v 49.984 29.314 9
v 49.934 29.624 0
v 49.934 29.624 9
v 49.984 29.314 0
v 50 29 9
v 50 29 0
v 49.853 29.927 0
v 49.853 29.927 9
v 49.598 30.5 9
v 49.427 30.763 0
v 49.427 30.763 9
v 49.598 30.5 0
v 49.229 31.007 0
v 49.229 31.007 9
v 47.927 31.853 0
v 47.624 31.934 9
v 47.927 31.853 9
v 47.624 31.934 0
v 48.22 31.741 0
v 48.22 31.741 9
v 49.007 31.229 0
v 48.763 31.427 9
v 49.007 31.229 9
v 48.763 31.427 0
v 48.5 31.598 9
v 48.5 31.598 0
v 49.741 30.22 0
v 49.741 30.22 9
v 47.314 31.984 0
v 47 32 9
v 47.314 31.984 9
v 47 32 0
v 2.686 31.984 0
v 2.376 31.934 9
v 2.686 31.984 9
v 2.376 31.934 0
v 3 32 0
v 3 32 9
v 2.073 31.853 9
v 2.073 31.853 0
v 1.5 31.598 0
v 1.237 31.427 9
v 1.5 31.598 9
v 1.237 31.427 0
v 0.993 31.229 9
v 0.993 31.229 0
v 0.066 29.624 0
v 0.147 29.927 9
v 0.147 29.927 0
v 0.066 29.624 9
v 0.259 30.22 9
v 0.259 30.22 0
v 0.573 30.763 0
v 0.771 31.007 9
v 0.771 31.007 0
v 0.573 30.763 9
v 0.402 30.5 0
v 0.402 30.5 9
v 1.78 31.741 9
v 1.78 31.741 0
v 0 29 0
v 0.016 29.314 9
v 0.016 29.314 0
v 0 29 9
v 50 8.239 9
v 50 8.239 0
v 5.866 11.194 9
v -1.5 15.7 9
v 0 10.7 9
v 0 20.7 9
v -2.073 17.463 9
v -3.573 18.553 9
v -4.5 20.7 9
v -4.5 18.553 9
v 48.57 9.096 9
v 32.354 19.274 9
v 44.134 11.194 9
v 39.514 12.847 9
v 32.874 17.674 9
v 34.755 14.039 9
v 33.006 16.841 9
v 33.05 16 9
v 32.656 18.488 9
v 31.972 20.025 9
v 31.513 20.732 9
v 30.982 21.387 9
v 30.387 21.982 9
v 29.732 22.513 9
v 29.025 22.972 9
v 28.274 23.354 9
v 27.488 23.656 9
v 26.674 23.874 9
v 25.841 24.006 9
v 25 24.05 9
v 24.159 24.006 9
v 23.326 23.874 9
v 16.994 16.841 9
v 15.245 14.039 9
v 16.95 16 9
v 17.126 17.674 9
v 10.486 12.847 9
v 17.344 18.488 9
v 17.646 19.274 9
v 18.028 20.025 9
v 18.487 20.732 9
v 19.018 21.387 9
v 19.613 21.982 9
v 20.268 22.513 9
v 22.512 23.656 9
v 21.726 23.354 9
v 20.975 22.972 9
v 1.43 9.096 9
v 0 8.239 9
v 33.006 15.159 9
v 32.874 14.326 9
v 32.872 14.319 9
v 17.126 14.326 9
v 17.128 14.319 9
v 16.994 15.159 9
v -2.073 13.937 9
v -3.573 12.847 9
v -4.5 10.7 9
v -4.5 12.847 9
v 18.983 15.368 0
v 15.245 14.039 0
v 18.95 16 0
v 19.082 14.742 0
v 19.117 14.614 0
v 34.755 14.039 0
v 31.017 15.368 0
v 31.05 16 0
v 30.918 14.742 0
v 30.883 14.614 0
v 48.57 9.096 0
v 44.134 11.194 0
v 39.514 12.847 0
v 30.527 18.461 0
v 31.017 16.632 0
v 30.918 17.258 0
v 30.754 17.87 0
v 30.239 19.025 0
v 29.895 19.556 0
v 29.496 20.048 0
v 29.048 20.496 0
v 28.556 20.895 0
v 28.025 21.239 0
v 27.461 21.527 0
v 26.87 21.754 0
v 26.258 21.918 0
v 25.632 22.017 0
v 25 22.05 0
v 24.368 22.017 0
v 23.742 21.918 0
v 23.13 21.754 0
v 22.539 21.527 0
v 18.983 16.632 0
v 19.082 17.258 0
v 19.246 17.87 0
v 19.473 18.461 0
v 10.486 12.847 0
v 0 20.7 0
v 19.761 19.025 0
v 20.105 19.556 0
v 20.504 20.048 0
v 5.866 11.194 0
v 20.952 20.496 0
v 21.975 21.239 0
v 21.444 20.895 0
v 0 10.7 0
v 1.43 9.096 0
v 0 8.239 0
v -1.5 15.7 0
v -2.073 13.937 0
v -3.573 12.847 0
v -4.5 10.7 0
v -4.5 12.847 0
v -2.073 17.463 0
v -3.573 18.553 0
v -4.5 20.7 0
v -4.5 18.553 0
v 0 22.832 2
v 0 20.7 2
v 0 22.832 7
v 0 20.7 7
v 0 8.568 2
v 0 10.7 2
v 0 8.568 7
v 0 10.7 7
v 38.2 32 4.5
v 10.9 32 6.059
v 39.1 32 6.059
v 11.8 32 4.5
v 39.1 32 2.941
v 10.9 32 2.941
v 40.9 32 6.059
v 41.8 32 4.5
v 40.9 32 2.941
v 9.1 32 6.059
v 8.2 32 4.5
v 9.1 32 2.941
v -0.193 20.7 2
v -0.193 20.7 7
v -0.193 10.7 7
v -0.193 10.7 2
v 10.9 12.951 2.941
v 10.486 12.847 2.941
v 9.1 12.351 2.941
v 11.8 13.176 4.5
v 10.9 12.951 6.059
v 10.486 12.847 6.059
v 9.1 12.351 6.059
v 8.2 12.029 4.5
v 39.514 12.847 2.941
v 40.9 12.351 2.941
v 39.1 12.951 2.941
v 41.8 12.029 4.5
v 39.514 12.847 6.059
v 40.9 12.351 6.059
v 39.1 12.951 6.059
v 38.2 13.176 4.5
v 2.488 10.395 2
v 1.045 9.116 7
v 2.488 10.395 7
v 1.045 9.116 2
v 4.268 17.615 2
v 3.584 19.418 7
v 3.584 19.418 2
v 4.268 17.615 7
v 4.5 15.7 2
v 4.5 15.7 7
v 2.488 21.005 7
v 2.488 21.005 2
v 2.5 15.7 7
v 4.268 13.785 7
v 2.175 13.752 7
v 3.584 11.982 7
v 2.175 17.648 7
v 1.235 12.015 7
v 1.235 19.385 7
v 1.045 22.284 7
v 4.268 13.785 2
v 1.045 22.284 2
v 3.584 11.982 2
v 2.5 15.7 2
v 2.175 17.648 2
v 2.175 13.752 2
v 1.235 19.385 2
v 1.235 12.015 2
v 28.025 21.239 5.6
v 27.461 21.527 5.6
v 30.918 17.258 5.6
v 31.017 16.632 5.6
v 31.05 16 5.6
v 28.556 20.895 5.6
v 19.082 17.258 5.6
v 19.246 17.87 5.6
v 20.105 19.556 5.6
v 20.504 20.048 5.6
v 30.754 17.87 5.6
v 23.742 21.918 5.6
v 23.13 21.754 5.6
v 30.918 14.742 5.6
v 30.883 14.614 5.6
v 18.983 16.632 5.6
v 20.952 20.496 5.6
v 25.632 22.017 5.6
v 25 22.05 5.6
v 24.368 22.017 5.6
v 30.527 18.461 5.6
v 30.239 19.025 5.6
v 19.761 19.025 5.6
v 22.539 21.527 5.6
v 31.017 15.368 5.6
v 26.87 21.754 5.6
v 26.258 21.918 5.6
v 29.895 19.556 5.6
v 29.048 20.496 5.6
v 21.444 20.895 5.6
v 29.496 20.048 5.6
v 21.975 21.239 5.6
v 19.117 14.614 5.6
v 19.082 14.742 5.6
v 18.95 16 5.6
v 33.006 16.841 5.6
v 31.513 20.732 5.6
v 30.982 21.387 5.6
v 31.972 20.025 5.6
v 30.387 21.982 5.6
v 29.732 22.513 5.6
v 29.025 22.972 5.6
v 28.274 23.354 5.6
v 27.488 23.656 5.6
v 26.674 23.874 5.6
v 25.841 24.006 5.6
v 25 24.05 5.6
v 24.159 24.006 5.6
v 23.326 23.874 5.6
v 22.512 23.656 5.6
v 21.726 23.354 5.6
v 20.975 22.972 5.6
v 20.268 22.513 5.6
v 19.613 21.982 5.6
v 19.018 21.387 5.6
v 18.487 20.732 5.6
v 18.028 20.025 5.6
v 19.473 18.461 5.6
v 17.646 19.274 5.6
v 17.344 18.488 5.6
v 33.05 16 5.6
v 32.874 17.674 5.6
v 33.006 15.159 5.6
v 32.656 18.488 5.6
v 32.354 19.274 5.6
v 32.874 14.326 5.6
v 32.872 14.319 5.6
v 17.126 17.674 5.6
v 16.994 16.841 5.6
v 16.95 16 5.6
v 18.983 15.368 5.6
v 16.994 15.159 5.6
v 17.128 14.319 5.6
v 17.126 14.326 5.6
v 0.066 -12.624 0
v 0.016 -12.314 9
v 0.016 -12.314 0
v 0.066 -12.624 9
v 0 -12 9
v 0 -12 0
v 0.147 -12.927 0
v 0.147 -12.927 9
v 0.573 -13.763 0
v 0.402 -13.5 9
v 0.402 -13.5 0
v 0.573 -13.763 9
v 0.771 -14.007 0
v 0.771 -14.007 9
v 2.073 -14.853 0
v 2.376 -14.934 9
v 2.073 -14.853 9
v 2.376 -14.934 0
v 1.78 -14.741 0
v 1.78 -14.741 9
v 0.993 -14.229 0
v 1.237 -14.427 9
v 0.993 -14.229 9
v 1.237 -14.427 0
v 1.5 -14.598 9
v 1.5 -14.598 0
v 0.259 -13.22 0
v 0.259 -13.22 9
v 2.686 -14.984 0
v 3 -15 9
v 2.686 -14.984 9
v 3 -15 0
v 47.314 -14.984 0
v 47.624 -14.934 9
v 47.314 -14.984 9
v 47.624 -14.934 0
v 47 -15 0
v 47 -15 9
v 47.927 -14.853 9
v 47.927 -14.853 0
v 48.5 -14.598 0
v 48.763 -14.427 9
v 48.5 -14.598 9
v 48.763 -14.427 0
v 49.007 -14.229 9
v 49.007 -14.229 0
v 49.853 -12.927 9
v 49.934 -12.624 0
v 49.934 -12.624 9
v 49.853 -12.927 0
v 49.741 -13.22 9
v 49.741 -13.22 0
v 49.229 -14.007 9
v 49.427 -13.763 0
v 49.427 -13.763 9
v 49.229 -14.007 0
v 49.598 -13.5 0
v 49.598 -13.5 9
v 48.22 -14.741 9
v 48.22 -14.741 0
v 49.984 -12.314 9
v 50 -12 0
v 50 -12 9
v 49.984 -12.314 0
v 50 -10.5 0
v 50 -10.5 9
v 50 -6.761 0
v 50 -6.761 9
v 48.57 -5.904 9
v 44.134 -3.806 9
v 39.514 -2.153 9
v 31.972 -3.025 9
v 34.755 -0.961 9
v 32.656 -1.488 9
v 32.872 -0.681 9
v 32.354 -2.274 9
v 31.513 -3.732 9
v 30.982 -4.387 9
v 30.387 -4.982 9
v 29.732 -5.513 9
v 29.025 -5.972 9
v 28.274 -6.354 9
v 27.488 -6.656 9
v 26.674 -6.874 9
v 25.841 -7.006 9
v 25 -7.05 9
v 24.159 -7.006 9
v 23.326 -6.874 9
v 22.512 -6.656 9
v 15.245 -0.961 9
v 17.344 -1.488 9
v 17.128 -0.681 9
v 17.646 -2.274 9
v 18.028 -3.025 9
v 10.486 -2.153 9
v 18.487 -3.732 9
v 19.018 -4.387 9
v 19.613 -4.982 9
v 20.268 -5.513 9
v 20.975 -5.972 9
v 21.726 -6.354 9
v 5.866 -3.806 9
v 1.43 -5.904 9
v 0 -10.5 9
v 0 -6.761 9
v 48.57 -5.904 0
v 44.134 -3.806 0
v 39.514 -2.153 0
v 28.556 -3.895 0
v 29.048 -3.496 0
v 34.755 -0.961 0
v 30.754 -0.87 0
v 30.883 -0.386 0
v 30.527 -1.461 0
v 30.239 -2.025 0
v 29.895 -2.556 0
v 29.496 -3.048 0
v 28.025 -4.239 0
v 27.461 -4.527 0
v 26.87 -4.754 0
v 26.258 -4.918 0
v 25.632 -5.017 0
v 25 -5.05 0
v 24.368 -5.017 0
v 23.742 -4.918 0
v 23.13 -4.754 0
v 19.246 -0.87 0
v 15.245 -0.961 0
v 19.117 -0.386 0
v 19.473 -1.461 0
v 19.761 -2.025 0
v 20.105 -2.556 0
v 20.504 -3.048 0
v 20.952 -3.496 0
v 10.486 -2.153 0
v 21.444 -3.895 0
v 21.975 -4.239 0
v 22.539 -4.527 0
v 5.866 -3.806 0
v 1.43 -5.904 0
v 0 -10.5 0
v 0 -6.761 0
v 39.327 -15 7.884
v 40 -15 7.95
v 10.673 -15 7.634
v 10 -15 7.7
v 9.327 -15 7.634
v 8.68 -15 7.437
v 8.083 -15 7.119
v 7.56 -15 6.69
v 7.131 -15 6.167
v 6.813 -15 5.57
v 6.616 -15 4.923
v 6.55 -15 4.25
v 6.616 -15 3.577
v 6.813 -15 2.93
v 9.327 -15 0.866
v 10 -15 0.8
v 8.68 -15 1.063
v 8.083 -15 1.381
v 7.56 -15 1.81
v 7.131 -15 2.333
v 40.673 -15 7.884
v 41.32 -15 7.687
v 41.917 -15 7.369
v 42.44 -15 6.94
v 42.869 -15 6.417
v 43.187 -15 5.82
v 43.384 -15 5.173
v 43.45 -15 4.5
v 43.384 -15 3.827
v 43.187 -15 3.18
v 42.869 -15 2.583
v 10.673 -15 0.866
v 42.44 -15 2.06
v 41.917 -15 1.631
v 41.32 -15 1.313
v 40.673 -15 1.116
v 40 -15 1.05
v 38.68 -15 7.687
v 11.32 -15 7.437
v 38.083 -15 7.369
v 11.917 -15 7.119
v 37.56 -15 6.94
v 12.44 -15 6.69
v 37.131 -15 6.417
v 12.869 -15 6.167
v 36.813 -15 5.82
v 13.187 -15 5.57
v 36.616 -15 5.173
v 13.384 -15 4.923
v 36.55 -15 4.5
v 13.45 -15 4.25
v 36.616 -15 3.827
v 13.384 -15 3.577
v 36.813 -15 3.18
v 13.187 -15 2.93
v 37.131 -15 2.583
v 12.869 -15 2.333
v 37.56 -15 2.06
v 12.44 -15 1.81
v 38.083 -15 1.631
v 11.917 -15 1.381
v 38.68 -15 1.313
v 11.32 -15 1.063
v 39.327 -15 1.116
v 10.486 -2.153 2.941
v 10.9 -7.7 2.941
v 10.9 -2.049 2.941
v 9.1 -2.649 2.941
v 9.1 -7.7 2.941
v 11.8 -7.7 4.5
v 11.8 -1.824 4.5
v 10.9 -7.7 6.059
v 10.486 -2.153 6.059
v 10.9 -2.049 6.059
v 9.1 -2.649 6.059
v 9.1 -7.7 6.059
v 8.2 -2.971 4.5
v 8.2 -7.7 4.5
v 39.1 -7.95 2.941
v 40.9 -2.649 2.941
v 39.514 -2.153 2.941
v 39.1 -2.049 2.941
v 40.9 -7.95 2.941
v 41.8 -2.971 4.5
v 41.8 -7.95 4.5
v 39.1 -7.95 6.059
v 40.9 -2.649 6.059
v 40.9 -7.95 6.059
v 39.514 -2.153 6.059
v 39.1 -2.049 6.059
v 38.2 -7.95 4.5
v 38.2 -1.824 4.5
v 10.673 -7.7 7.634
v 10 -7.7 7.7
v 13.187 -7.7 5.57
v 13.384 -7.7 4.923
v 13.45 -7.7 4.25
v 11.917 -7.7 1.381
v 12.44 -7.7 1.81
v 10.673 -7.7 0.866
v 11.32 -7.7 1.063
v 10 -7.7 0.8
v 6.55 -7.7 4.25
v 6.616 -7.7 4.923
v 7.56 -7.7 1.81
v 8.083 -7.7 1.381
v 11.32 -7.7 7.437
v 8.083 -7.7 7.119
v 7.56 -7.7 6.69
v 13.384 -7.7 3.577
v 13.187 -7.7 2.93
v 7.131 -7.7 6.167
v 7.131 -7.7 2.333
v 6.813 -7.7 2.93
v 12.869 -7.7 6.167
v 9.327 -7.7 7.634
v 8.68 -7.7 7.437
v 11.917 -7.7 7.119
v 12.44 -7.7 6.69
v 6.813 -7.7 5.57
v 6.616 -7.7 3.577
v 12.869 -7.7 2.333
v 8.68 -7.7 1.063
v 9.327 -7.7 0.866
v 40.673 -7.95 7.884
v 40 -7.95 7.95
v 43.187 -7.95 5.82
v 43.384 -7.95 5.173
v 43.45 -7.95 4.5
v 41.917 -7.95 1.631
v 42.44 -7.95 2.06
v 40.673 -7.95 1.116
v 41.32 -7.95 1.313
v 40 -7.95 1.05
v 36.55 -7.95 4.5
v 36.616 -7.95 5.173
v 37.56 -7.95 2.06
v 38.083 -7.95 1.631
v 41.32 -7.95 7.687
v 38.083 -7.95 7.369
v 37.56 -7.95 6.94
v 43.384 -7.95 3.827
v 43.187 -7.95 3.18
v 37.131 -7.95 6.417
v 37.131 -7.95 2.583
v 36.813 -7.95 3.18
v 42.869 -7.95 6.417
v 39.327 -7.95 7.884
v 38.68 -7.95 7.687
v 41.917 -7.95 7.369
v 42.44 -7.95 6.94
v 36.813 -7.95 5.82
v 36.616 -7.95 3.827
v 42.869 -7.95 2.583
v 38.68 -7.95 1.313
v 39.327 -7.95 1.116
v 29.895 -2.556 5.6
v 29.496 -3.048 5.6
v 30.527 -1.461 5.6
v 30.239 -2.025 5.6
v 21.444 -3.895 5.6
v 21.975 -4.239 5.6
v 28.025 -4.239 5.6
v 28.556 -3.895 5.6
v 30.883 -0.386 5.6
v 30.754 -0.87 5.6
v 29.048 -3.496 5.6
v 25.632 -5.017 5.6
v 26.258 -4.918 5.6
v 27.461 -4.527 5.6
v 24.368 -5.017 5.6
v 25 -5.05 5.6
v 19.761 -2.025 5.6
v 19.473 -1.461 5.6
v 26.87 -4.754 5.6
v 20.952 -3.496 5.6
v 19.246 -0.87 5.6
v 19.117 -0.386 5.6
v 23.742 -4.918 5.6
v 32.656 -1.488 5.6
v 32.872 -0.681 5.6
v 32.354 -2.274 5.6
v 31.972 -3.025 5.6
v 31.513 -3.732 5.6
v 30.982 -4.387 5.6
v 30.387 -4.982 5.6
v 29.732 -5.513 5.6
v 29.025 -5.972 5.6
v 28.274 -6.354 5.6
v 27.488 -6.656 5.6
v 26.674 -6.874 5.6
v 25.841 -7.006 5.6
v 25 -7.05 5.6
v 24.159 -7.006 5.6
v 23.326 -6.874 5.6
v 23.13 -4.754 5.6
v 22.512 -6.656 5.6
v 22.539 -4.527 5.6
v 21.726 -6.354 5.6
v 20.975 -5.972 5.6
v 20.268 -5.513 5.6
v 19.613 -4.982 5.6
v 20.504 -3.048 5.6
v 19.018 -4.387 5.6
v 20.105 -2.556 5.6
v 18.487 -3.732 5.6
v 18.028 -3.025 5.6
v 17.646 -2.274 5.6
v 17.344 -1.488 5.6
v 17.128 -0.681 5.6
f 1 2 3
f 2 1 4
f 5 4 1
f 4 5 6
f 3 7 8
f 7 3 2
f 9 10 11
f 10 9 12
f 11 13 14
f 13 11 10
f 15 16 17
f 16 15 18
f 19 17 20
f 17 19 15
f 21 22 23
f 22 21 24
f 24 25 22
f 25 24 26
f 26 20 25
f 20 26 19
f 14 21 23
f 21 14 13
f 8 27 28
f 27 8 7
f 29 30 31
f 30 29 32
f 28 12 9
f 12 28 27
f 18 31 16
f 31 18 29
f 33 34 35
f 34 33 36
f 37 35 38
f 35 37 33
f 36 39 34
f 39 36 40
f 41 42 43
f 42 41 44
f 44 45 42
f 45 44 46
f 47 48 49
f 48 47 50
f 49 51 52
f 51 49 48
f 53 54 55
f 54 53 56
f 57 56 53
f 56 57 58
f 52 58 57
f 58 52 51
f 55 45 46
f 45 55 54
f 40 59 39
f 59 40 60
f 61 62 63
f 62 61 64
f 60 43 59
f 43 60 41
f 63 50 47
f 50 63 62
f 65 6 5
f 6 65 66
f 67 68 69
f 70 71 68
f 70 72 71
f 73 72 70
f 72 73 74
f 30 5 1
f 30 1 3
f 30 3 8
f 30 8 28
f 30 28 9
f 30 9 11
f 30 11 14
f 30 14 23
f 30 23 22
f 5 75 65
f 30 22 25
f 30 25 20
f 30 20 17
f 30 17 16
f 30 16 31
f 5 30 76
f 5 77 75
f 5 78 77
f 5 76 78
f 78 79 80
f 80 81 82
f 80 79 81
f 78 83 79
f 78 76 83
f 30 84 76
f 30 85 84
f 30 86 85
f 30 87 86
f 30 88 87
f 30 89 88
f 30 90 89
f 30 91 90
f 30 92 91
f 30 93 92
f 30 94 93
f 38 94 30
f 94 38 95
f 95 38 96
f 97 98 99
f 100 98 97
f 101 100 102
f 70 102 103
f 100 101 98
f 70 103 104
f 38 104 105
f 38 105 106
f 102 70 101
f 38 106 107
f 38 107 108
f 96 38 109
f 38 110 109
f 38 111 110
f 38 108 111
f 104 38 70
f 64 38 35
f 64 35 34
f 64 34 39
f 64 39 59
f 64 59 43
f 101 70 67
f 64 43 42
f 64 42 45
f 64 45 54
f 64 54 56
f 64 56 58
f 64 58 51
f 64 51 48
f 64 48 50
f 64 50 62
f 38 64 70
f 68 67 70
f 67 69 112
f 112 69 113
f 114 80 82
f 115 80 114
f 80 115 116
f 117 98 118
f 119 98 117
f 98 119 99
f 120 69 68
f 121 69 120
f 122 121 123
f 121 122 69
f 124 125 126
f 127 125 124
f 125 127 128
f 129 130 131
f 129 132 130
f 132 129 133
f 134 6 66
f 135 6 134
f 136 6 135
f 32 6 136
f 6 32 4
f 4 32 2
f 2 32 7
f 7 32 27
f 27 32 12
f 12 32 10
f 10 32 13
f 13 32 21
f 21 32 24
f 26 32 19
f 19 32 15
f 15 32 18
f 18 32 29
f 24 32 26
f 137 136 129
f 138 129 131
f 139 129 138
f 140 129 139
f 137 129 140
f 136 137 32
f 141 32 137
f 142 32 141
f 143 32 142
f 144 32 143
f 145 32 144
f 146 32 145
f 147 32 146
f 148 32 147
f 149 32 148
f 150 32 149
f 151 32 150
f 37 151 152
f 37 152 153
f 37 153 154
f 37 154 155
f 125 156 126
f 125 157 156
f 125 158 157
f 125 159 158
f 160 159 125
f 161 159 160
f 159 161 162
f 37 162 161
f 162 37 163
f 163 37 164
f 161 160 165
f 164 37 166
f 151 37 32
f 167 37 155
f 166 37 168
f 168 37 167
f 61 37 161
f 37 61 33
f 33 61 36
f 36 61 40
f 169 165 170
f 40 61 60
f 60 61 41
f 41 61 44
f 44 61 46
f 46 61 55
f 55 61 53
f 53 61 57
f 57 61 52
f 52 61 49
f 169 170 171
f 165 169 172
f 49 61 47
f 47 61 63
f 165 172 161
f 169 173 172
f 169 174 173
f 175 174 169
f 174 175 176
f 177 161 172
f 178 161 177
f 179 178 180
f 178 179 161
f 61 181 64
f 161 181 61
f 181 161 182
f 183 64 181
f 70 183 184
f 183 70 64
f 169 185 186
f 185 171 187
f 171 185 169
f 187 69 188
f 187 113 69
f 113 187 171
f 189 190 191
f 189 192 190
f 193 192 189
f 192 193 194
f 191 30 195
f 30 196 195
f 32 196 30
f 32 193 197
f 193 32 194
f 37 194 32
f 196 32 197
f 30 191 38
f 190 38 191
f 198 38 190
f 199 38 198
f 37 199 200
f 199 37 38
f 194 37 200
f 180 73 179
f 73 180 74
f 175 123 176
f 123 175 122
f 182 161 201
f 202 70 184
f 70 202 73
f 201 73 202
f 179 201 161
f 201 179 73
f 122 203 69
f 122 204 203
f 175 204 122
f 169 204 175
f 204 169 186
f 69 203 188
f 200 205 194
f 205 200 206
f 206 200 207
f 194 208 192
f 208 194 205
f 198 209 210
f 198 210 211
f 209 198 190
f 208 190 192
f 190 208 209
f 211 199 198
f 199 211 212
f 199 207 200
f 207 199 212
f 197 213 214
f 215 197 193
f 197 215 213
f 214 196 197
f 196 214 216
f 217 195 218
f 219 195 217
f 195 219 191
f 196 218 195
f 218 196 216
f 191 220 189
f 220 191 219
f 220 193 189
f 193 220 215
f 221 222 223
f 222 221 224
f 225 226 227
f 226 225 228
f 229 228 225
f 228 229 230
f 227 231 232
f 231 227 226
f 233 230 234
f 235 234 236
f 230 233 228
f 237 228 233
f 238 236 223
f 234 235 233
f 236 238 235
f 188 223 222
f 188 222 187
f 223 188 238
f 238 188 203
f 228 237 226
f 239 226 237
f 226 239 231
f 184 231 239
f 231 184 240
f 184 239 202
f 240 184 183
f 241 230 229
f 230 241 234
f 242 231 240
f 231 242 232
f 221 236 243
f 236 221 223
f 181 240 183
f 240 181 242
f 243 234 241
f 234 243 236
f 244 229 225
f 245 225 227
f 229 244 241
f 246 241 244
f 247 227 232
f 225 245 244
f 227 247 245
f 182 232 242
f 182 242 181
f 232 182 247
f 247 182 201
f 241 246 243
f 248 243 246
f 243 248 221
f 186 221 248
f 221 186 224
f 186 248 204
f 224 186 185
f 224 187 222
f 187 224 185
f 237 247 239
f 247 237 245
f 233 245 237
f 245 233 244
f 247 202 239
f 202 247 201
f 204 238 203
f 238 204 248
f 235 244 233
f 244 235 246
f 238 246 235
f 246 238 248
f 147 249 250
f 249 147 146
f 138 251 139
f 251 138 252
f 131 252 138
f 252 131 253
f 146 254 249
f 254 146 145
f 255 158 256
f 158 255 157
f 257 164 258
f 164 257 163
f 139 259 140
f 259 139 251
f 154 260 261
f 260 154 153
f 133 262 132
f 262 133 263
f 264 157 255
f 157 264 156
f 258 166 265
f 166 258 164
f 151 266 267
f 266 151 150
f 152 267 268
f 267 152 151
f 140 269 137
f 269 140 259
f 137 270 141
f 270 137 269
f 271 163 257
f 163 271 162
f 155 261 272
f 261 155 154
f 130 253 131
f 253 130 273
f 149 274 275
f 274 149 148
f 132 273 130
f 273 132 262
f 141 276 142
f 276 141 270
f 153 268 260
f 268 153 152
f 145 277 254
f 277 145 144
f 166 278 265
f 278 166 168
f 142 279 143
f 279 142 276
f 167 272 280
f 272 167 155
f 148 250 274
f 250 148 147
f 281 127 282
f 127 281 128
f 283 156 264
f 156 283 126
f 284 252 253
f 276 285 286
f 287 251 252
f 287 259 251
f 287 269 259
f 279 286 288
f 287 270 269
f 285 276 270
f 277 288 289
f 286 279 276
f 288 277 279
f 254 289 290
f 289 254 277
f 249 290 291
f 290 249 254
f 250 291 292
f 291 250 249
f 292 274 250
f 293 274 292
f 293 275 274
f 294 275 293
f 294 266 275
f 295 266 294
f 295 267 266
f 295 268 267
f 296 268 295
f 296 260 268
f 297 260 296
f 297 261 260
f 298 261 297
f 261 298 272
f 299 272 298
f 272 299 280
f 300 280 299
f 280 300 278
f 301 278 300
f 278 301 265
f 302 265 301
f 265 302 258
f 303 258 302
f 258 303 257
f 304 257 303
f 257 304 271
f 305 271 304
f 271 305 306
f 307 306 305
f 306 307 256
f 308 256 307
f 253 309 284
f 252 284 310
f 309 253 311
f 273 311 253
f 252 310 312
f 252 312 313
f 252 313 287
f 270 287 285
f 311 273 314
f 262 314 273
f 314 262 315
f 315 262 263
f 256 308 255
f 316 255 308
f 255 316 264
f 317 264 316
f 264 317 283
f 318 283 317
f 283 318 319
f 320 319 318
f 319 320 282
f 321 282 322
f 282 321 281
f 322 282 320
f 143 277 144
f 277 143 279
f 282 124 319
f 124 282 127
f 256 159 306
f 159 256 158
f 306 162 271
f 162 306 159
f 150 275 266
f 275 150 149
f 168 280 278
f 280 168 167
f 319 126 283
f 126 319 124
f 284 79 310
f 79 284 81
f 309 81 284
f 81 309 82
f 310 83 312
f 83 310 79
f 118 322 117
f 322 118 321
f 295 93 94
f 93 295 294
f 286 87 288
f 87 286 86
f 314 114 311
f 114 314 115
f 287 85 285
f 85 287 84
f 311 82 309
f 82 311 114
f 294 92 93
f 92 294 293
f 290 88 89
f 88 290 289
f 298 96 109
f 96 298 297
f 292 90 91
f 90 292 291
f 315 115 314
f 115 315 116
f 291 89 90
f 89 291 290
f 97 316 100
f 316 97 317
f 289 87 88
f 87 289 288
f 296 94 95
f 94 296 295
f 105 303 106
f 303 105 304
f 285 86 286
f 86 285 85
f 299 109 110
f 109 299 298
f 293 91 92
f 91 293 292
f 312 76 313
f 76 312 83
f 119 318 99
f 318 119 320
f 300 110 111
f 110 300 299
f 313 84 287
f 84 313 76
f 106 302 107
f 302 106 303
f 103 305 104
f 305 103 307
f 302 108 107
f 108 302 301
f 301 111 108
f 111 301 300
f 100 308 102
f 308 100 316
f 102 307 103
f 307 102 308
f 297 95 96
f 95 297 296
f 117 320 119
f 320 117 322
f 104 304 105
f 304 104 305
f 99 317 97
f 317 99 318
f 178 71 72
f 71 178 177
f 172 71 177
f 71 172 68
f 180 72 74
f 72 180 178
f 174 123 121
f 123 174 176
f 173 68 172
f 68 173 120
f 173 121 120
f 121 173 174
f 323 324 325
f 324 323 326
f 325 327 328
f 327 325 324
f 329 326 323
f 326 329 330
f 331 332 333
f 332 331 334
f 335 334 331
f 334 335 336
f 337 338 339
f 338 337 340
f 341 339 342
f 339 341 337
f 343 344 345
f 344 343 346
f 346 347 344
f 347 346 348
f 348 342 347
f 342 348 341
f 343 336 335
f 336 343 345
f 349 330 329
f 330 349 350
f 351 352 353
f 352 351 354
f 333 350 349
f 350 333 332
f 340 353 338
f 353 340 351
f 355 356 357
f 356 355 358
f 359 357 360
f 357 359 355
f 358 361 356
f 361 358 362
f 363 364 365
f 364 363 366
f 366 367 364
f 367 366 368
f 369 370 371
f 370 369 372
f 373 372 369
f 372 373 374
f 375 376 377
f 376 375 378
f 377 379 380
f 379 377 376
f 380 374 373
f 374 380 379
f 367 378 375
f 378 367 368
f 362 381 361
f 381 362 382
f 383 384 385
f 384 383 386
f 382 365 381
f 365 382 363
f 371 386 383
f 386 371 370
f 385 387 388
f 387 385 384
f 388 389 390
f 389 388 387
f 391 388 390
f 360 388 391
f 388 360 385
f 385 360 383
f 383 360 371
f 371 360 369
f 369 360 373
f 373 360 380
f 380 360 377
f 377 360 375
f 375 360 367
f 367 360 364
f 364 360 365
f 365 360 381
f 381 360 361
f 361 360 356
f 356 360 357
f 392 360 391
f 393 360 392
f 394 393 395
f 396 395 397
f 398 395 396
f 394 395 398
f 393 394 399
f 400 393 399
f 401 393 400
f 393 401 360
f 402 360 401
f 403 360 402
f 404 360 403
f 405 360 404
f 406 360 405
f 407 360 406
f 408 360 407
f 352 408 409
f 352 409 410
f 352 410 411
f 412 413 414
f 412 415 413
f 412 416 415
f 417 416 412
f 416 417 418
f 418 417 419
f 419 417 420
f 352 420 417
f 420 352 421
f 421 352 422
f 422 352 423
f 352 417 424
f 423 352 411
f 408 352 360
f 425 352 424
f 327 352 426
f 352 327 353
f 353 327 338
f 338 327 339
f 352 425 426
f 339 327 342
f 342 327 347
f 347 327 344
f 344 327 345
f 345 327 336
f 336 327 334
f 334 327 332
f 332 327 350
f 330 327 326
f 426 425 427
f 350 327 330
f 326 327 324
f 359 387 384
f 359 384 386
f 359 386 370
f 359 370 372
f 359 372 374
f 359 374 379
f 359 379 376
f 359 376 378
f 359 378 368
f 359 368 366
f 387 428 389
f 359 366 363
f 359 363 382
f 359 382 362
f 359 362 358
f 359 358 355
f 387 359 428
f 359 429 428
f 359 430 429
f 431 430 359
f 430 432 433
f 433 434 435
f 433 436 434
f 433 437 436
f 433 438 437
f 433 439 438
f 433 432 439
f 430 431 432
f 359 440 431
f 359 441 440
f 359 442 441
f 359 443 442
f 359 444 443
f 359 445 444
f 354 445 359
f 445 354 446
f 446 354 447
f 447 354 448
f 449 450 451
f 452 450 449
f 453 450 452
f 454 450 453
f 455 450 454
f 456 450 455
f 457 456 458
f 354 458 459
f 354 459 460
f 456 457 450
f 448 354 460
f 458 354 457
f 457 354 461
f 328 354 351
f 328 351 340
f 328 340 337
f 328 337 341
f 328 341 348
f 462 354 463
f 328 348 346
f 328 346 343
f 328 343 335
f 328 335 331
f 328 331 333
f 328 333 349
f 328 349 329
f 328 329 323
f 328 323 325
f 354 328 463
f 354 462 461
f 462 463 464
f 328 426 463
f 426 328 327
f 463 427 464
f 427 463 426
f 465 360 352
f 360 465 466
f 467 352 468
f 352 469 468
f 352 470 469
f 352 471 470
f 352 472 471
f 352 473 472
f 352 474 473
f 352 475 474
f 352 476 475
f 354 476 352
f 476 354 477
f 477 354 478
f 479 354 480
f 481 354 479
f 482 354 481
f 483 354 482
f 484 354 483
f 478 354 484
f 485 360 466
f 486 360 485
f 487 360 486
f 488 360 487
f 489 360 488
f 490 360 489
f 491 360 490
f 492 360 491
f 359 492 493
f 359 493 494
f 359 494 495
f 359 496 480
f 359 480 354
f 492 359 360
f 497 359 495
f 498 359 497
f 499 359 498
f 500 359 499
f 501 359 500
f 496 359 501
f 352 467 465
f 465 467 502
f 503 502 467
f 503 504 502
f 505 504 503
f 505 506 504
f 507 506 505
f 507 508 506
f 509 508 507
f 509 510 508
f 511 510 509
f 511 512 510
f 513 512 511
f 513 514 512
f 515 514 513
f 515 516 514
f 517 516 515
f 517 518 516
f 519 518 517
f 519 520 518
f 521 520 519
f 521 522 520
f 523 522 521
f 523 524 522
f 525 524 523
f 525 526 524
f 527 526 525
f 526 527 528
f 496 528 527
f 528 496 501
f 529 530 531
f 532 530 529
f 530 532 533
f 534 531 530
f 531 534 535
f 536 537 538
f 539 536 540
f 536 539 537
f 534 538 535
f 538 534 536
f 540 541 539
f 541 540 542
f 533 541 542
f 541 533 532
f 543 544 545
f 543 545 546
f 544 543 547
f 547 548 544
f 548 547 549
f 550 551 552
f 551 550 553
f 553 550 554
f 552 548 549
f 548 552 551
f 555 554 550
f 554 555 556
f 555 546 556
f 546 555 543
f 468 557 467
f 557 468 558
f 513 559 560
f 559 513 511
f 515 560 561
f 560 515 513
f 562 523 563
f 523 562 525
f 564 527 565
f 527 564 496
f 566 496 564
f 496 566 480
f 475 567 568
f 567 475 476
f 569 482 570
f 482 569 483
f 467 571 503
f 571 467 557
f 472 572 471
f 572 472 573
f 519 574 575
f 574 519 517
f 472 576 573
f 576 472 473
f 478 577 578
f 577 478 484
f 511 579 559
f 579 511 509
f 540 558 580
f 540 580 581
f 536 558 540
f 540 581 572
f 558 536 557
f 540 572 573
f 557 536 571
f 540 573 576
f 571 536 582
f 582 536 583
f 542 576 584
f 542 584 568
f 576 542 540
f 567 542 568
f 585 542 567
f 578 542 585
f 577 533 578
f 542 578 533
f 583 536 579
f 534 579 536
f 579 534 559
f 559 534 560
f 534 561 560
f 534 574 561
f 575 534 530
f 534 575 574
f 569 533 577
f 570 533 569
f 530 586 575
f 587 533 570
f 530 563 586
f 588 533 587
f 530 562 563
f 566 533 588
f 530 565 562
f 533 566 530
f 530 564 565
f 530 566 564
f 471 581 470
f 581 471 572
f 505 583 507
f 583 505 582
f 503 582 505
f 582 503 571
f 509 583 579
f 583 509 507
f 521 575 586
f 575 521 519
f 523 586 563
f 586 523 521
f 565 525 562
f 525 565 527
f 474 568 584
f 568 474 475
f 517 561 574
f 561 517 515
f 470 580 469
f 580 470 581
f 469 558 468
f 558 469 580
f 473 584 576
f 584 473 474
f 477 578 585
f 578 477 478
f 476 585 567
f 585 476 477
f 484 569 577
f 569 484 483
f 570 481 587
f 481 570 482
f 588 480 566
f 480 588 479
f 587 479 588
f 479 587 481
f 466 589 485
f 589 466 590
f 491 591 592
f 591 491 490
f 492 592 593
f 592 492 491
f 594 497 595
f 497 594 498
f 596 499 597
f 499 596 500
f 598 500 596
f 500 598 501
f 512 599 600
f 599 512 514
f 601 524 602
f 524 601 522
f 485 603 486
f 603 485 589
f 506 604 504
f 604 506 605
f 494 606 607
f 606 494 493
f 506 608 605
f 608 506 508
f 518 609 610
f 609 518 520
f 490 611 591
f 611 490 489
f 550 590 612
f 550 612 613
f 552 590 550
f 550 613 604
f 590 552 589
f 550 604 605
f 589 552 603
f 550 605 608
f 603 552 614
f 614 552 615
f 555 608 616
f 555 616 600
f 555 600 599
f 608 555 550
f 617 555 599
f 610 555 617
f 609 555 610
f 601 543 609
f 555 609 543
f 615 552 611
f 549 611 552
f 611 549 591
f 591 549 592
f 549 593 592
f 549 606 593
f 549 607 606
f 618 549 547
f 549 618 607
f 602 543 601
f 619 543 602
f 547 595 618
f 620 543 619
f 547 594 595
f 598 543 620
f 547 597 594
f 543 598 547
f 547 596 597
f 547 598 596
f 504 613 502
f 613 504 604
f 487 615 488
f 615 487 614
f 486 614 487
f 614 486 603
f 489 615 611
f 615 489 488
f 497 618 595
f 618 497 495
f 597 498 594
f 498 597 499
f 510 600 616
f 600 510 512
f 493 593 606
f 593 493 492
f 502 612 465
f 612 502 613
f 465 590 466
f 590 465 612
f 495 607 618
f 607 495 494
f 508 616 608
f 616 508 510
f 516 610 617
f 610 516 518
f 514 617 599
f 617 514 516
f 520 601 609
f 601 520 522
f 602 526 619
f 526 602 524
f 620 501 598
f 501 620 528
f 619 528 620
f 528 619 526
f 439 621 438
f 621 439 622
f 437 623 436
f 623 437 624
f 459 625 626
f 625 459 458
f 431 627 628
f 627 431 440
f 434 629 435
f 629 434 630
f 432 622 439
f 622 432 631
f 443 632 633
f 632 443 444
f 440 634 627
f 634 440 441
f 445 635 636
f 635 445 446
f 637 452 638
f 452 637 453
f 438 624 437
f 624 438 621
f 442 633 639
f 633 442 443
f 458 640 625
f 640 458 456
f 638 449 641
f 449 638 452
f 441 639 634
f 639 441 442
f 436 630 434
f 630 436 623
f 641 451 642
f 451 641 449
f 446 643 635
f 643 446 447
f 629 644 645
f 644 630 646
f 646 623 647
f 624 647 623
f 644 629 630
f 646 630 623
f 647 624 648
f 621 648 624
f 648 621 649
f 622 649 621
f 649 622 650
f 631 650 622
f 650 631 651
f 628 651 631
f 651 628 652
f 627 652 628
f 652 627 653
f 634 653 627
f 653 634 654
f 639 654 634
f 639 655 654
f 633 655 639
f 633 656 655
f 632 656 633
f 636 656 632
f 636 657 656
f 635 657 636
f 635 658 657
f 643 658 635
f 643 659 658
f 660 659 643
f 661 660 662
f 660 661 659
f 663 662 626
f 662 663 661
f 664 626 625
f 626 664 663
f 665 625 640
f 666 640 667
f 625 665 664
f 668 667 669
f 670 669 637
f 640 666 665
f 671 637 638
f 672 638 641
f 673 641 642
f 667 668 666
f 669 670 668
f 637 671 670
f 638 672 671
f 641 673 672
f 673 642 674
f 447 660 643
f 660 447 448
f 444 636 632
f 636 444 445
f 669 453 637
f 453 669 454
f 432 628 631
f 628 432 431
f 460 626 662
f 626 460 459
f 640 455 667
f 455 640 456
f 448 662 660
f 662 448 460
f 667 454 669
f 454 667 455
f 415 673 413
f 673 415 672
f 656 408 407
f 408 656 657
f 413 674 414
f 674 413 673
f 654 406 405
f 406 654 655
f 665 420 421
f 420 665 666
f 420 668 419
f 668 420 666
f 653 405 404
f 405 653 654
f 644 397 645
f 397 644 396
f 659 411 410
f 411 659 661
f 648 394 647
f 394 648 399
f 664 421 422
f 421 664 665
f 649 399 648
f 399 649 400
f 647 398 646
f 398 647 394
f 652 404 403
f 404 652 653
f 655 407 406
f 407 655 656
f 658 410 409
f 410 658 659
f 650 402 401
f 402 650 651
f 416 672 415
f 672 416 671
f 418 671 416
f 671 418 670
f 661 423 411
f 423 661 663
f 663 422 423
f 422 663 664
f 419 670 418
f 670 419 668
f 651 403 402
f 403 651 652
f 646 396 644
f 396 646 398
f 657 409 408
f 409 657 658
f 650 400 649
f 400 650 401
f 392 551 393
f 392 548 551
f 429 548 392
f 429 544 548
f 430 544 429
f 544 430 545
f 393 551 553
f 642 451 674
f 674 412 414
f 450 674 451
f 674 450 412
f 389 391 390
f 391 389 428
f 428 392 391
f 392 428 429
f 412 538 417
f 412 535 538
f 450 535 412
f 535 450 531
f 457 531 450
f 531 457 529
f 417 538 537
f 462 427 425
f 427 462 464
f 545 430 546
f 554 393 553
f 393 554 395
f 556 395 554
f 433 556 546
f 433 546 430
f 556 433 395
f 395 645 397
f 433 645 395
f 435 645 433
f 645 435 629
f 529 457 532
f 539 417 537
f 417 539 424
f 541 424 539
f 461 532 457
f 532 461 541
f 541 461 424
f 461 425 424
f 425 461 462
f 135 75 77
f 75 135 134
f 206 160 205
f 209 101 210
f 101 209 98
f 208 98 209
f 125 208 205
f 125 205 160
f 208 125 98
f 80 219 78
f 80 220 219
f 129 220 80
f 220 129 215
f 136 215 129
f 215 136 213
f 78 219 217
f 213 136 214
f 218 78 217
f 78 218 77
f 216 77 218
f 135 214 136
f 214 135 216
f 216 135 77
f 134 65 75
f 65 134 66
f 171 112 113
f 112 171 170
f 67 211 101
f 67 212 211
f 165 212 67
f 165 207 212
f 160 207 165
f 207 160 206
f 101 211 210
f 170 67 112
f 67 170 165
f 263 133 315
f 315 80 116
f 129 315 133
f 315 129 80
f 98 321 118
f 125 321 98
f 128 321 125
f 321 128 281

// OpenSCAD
// file: ../library.scad
//rounded cube Functions from: http://www.thingiverse.com/thing:38069


module cube_fillet(size,radius=-1,vertical,top,bottom,center=false,$fn=0){
    if (center) {
        cube_fillet_inside(size, radius, vertical, top, bottom, $fn=$fn);
    } else {
        translate([size[0]/2, size[1]/2, size[2]/2])
            cube_fillet_inside(size, radius, vertical, top, bottom, $fn=$fn);
    }
}
module fillet(radius, height=100, $fn=60) {  
    //this creates negative of fillet,
    //i.e. thing to be substracted from object
    translate([-radius, -radius, -height/2-0.01])
        difference() {
            cube([radius*2, radius*2, height+0.02]);
            cylinder(r=radius, h=height+0.02, $fn=$fn);
        }
}

module cube_negative_fillet(size,radius=-1,vertical, top,bottom,$fn=0){
    j=[1,0,1,0];

    for (i=[0:3]) {
        if (radius > -1) {
            rotate([0, 0, 90*i])
                translate([size[1-j[i]]/2, size[j[i]]/2, 0])
                    fillet(radius, size[2], $fn=$fn);
        } else {
            rotate([0, 0, 90*i])
                translate([size[1-j[i]]/2, size[j[i]]/2, 0])
                    fillet(vertical[i], size[2], $fn=$fn);

        }
        rotate([90*i, -90, 0])
            translate([size[2]/2, size[j[i]]/2, 0 ])
                fillet(top[i], size[1-j[i]], $fn=$fn);
        rotate([90*(4-i), 90, 0])
            translate([size[2]/2, size[j[i]]/2, 0])
                fillet(bottom[i], size[1-j[i]], $fn=$fn);
    }
}

module cube_fillet_inside(size,radius=-1,vertical,top,bottom,$fn=0){

    if (radius == 0) {
        cube(size, center=true);
    } else {
        difference() {
            cube(size, center=true);
            cube_negative_fillet(size, radius, vertical, top, bottom, $fn=$fn);
        }
    }
}
// file: ../dimensions.scad
// Dimensions
// Author: sdavi


LM8UU = [8, 15, 24];//rod diameter,outter diameter, length
LM12UU = [12, 21, 30];
LM12LUU = [12, 21, 57];
LM12UUx2 = [LM12UU[0], LM12UU[1], LM12UU[2]*2];

BEARING_624 = [4,13,5]; //inner diameter(hole), outter diameter, thickness (http://reprap.org/wiki/Ball_bearing)
BEARING_2x624 = [4, 13, 10]; // 2 624 bearings together, good size for GT2

BEARING_6300 = [10,35,11]; //inner diameter, outer diameter, thickness

vslot_wheel = [23.89,10.23];	//23.89 & 10.23
vslot_wheel_hole = 5+0.5;
vslot_wheel_eccentric = 7.2+0.5; //hole for eccentric spacer
vslot_wheel_spacer_length = 6.35;


t_nut_length = 15+1; //hole in center 1mm cleanance incase hole isnt actually center




GT2_belt_width = 6;
GT2_belt_pitch = 2;
GT2_belt_thickness = 1.38;
GT2_belt_tooth_height = 0.75;  
GT2_belt_tooth_ratio = 0.5;



GT2_pulley_geared_diameter=12.2;//measured from top of tooth to top of tooth opp side// 12.2 is for the 20 tooth pulley

//from metric (prusa i3)
m4_diameter = 4.6;
m4_nut_diameter = 7.6;
m4_nut_diameter_horizontal = 8.15;

m3_diameter = 3.6;
m3_nut_diameter = 5.3;
m3_nut_diameter_horizontal = 6.8;
m3_washer_diameter = 6.9;
//end i3 variables

m5_diameter = 5.5;

//Hex Head M3x30: Head 5.5mm flat to flat, 2.12mm thick
m3_hex_head_diameter = 5.5*2/sqrt(3) + 0.2;

M4 = m4_diameter;
M3 = m3_diameter;
M5 = m5_diameter;
m4_washer_thickness = 0.8; //flat and penny washers
m4_washer_diameter = 9.6;

nema17_holes = 31;// mm between screws
nema17_width = 42; //width
nema17_height = 48;
// file: ../configuration.scad
// Configuration
// Author: sdavi


include <dimensions.scad>
use <library.scad>


x_rod_distance = 45;

y_bearing = LM8UU;
x_bearing = LM8UU;
//z_bearing = LM12UUx2;
z_bearing = LM12LUU;
belt_bearing = BEARING_2x624;


end_belt_bearing_distance = 25;// distance between 2 bearings on y-ends
belt_clearance = 9.5; //space for belts
x_belt_clearance = 5; //spacing between x-axis vslot and belt

frame_screw = M5; //m5 screws for v/tslot

// calculated vars


//y bearing block
y_bearing_block_length = 2*y_bearing[2] + M3*2 + 5;
//y_bearing_block_width = y_bearing[1]+5;
y_bearing_block_width = 20; //vslot frame width

y_bearing_block_height = 6+y_bearing[1]/2;

//xy_bearing_distance = y_bearing_block_width/2+belt_clearance+belt_bearing[1]/2; //distance between center of y-bearing to center of x-belt bearing 
xy_bearing_distance = vslot_wheel[1]/2+vslot_wheel_spacer_length+belt_clearance+belt_bearing[1]/2; //distance between center of v_slot to center of x-belt bearing 




//min height for belt bearings
min_beltbearing_height = max(((belt_bearing[2]+m4_washer_thickness*2) * 2), y_bearing_block_height);
// main file
// E3D Hotend Bowden Mount
// Author: sdavi

//Inspired by: http://www.thingiverse.com/thing:148536

//Designed to fit the vertical X-Carriage using the 30mm spaced mounting holes

include <../configuration.scad>




E3D_Mount(arms=0);
//calibration();




padding = 0.1; //if holes print small can make them a bit bigger

//dimension taken from: http://files.e3d-online.com/Drawings/E3D_Heat_Sink.jpg
e3d_top_diameter = 16 + padding; 
e3d_top_height = 3.7;
e3d_recess_diameter = 12 + padding;
e3d_recess_height = 5.6;

e3d_shroud_width = 32; 

//*** mounting plate settings***
mounting_screws_distance = 30; //prusa i3 has 30 and 20 between mounting screws on X-carriage
//will use the 30mm distance 
mounting_screw_diameter = 3;
//
plate_width = 50;
//plate_length = 28; //same as gregs wade
plate_length = e3d_shroud_width;
plate_depth = 9;


//screws
m3_diameter = 3.6;
m3_washer_diameter = 6.9;
m4_diameter = 4.7;
m4_nut_diameter = 7.6;
m4_nut_diameter_horizontal = 8.15;


//*** Arm mount for accessories, fans, etc ***
arm_depth=plate_depth;
arm_width= arm_depth;
arm_screw_distance=46;
arm_length=arm_screw_distance+m4_diameter/2;







//mounting_plate();

/*
	Calibration piece to ensure mount for hotend will fit (this should be a tight fit)

*/
module calibration(){
	difference(){
		cube([e3d_top_diameter+2, e3d_top_diameter+2, plate_depth]);
		translate([(e3d_top_diameter+2)/2,(e3d_top_diameter+2)/2,0]) hotend_mount();
		cube([e3d_top_diameter+2, (e3d_top_diameter+2)/2, plate_depth]);
	}

}


module E3D_Mount(arms=1) {

  translate([0, -15, 0]){
    intersection() {
      mounting_plate(arms);
      separator();
    }
  }

  difference() {
    mounting_plate(arms);
    separator();
  }
}



module mounting_plate(arms=1){

	difference(){
		union(){
			cube_fillet([plate_width, plate_length, plate_depth], center=false, vertical=[3,3,3,3], $fn=60);
		
			//arms for Fan Mount, cabletie 
			translate([-arm_width/2,plate_length/2-10/2-0.3,0]) 
				cube_fillet([arm_width, 10, arm_depth], vertical=[0,0,0,0], $fn=12);

				//arms
			if(arms == 1){
				translate([-arm_width/2,plate_length-arm_length,0]) 
					cube_fillet([arm_width, arm_length-plate_length+5, arm_depth], vertical=[0,0,0,0], $fn=12);
				translate([plate_width-arm_width/2,plate_length-arm_length,0]) 
					cube_fillet([arm_width, arm_length-plate_length+5, arm_depth], vertical=[0,0,0,0], $fn=12);

				//rounded arm end
				translate([0,plate_length-arm_length,0]) 
					cylinder(r=(arm_width/2), h=plate_depth, center=false, $fn=60);
				translate([plate_width,plate_length-arm_length,0]) 
					cylinder(r=(arm_width/2), h=plate_depth, center=false, $fn=60);

				//rounded arm joint
				translate([arm_width/2,-6/2,0]) roundedArmJoint();
				translate([plate_width-arm_width/2-3,0,0]) rotate([0,0,-90]) 
					roundedArmJoint();

			}




				


		}

		//x-carriage holes
		translate([plate_width/2, plate_length/2, plate_depth/2]) rotate([90,0,0]){
			translate([-mounting_screws_distance/2, 0, 0]) 
				cylinder(r=m3_diameter/2, h=plate_length+0.1, center=true);
			translate([+mounting_screws_distance/2, 0, 0]) 
				cylinder(r=m3_diameter/2, h=plate_length+0.1, center=true);
		}

		//countersunk holes for carriage screws
		translate([plate_width/2, 7/2, plate_depth/2]) rotate([90,0,0]){
			translate([-mounting_screws_distance/2, -0.5/2, 0])
				cylinder(r=m3_washer_diameter/2, h=7+0.1+0.5, center=true, $fn=32);
			translate([+mounting_screws_distance/2, 0, 0]) 
				cylinder(r=m3_washer_diameter/2, h=7+0.1, center=true, $fn=32);
		}

		//cable groove
		translate([-arm_width/2,plate_length/2-0.3,0]) 
			cylinder(r=6/2, h=arm_depth, center=false);  
		//cable ziptie
		translate([-arm_width/2+1,plate_length/2-0.3,plate_depth/2-5/2]){
 			difference(){
				cylinder(r=8, h=5, center=false);  
				cylinder(r=6, h=5, center=false);  
			}
		}

		//holes for accessory mount. 
		translate([0, plate_length-arm_screw_distance, arm_depth/2])	 rotate([0,90,0]){	
			cylinder(r=m4_diameter/2, h=arm_width+0.1, center=true);  
			cylinder(h=3.5,r=m4_nut_diameter_horizontal/2,$fn=6, center=true); 
			rotate([0,-90,0]) translate([0,0,5/2]) cube([3.5, m4_nut_diameter, 5], center=true);
		}
		translate([plate_width, plate_length-arm_screw_distance, arm_depth/2])	 rotate([0,90,0]){	
			cylinder(r=m4_diameter/2, h=arm_width+0.1, center=true);  
			cylinder(h=3.5,r=m4_nut_diameter_horizontal/2,$fn=6, center=true); 
			rotate([0,-90,0]) translate([0,0,5/2]) cube([3.5, m4_nut_diameter, 5], center=true);
		}

		translate([plate_width+arm_width/2,arm_width/2,0]) 
			cylinder(r=(arm_width/2), h=plate_depth, center=false, $fn=60);
		translate([-arm_width/2,arm_width/2,0]) 
			cylinder(r=(arm_width/2), h=plate_depth, center=false, $fn=60);
		



		translate([plate_width/2, plate_length/2, 0]) hotend_mount();


		
	}


}

module roundedArmJoint(){
	difference(){
				cube([6/2, 6/2, plate_depth]);
				translate([6/2,0,0]) 
					cylinder(r=6/2, h=plate_depth, center=false, $fn=60);

			}
}


module hotend_mount(){

//cutout for E3D (and maybe J-Head too??) - tight fit
		
	cylinder(r=e3d_recess_diameter/2, h=e3d_recess_height, center=false, $fn=60);
	translate([0,0,e3d_recess_height])
		cylinder(r=e3d_top_diameter/2, h=e3d_top_height, center=false, $fn=60);

}


module separator() {
  translate([plate_width/2, -35, plate_depth/2]){
	cylinder(r=100/2, h=plate_depth + 1, center=true, $fn=64); 
  }
}
